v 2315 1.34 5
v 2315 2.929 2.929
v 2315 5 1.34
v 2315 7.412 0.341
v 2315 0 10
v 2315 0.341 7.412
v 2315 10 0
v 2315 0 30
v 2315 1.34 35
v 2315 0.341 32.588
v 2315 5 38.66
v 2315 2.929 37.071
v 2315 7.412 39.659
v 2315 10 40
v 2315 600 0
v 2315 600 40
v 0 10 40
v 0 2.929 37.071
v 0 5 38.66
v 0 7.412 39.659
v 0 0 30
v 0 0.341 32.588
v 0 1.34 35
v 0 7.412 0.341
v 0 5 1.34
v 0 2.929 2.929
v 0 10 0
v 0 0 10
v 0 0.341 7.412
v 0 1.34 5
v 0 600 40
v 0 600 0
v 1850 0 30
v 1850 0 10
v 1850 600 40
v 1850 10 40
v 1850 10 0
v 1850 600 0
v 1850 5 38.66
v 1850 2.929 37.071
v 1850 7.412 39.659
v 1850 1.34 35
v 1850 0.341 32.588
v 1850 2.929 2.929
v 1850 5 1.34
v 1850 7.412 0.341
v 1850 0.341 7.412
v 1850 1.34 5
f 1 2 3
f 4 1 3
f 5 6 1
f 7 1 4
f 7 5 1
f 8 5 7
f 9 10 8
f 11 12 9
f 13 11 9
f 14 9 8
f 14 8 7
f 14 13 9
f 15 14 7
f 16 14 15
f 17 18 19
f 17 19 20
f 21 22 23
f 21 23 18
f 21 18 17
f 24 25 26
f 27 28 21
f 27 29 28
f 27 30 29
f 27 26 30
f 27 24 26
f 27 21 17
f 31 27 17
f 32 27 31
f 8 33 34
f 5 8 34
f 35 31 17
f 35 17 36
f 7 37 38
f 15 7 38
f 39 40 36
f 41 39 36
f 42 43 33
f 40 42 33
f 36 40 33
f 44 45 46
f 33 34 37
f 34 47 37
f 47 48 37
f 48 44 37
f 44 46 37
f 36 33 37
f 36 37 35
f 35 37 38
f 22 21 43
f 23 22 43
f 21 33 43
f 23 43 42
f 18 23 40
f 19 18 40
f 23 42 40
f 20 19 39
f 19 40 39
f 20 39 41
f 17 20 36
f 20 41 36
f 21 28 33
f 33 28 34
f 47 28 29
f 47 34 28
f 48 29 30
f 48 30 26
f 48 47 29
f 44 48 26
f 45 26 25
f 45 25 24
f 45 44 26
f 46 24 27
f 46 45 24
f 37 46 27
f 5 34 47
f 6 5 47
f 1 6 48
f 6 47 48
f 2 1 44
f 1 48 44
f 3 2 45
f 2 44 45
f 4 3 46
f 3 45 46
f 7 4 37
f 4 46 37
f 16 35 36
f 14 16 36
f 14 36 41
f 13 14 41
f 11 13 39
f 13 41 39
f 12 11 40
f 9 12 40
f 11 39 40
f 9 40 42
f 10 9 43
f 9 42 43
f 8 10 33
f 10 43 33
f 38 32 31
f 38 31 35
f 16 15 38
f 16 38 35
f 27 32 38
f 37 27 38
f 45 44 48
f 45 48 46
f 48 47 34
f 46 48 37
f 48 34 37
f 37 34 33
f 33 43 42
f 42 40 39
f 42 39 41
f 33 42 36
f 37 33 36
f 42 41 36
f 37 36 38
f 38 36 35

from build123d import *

# Parameters (mm, degrees)
F0_W     = 1850
F0_H     = 600
F1_DEPTH = 40
F2_R     = 10
F3_DEPTH = 465


with BuildPart() as f1:
    # F0 (on Top) → F1 (new body)
    with BuildSketch(Plane.XY):
        with Locations((925, 300)):
            Rectangle(F0_W, F0_H)
    extrude(amount=F1_DEPTH)

    # F2
    f2_edges = [f1.edges().sort_by_distance(p)[0] for p in [
        (925, 0, 40),
        (925, 0, 0),
    ]]
    fillet(f2_edges, radius=F2_R)


with BuildPart() as f3:
    # F1_face (on face) → F3 (new body)
    with BuildSketch(Plane(origin=(1850, 300.533464, 20), x_dir=(0, 1, 0), z_dir=(1, 0, 0))):
        with BuildLine():
            Line((-300.533464, 10), (-300.533464, -10))
            ThreePointArc((-300.533464, -10), (-297.604532, -17.071068), (-290.533464, -20))
            Line((-290.533464, -20), (299.466536, -20))
            Line((299.466536, -20), (299.466536, 20))
            Line((299.466536, 20), (-290.533464, 20))
            ThreePointArc((-290.533464, 20), (-297.604532, 17.071068), (-300.533464, 10))
        make_face()
    extrude(amount=F3_DEPTH)


solid = Compound([f1.part, f3.part])
